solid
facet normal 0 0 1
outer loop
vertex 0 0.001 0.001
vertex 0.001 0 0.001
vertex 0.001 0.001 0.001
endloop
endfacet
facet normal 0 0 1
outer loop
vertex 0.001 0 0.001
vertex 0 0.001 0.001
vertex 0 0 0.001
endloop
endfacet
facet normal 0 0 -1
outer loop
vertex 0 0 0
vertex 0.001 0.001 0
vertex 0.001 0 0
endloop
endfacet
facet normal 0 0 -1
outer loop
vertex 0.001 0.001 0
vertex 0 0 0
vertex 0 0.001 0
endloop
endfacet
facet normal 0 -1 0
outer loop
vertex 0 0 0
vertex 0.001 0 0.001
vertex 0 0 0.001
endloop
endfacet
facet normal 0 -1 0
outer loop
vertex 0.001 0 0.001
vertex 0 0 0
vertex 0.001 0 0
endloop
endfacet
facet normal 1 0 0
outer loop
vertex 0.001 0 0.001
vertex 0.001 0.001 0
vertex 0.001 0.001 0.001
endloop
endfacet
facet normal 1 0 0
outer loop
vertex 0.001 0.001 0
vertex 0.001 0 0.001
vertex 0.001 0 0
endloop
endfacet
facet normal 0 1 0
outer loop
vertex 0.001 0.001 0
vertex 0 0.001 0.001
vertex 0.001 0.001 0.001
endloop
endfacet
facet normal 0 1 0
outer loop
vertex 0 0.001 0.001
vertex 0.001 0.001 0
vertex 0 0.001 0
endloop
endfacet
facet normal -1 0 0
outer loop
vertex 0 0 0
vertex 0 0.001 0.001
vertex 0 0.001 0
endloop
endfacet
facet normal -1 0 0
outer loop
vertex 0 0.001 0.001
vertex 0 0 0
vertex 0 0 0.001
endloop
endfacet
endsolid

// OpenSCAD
// t_smoke — proves the assert gate itself works.
//
// Tests are assert-only and must end in a sentinel cube: a file that emits no
// geometry exits 1 under `-o *.stl`, which would look like a test failure.
// Always render tests to .stl, never .csg -- with -o *.csg a FAILING assert
// exits 0, so a .csg gate reports every broken test as green. See AGENTS.md.

// The rule that replaces acos() everywhere (docs/developer/history.md §3).
function turn(a, b) = atan2(norm(cross(a, b)), a *b);

assert(abs(turn([ 1, 0, 0 ], [ 0, 1, 0 ]) - 90) < 1e-9, "turn(): orthogonal vectors must give 90 degrees");
assert(abs(turn([ 1, 0, 0 ], [ 1, 0, 0 ])) < 1e-9, "turn(): identical vectors must give 0 degrees");
assert(abs(turn([ 1, 0, 0 ], [ -1, 0, 0 ]) - 180) < 1e-9, "turn(): opposed vectors must give 180 degrees");

// The specific failure this rule exists to prevent: acos() NaNs when float error
// pushes its argument past 1.0, which is the near-collinear waypoint case.
// OpenSCAD 2021.01 has no is_nan(); the idioms that DO work here are
// `is_num(x)` (false for nan, true for inf) and `x == x` (false for nan only).
nearly = [ 1, 1e-9, 0 ];
assert(is_num(turn([ 1, 0, 0 ], nearly)), "turn(): must not NaN on near-collinear vectors");
assert(!is_num(acos(1.0000001)), "acos() past 1.0 is nan on 2021.01 -- this is why turn() exists");

// Exact developed length of the worked elbow (docs/reference/ir.md): 35 + quarter-arc + 35.
len_expected = 35 + (90 / 360) * 2 * PI * 15 + 35;
assert(abs(len_expected - 93.5619449019) < 1e-9, "worked elbow developed length");

cube(0.001); // sentinel -- see header
